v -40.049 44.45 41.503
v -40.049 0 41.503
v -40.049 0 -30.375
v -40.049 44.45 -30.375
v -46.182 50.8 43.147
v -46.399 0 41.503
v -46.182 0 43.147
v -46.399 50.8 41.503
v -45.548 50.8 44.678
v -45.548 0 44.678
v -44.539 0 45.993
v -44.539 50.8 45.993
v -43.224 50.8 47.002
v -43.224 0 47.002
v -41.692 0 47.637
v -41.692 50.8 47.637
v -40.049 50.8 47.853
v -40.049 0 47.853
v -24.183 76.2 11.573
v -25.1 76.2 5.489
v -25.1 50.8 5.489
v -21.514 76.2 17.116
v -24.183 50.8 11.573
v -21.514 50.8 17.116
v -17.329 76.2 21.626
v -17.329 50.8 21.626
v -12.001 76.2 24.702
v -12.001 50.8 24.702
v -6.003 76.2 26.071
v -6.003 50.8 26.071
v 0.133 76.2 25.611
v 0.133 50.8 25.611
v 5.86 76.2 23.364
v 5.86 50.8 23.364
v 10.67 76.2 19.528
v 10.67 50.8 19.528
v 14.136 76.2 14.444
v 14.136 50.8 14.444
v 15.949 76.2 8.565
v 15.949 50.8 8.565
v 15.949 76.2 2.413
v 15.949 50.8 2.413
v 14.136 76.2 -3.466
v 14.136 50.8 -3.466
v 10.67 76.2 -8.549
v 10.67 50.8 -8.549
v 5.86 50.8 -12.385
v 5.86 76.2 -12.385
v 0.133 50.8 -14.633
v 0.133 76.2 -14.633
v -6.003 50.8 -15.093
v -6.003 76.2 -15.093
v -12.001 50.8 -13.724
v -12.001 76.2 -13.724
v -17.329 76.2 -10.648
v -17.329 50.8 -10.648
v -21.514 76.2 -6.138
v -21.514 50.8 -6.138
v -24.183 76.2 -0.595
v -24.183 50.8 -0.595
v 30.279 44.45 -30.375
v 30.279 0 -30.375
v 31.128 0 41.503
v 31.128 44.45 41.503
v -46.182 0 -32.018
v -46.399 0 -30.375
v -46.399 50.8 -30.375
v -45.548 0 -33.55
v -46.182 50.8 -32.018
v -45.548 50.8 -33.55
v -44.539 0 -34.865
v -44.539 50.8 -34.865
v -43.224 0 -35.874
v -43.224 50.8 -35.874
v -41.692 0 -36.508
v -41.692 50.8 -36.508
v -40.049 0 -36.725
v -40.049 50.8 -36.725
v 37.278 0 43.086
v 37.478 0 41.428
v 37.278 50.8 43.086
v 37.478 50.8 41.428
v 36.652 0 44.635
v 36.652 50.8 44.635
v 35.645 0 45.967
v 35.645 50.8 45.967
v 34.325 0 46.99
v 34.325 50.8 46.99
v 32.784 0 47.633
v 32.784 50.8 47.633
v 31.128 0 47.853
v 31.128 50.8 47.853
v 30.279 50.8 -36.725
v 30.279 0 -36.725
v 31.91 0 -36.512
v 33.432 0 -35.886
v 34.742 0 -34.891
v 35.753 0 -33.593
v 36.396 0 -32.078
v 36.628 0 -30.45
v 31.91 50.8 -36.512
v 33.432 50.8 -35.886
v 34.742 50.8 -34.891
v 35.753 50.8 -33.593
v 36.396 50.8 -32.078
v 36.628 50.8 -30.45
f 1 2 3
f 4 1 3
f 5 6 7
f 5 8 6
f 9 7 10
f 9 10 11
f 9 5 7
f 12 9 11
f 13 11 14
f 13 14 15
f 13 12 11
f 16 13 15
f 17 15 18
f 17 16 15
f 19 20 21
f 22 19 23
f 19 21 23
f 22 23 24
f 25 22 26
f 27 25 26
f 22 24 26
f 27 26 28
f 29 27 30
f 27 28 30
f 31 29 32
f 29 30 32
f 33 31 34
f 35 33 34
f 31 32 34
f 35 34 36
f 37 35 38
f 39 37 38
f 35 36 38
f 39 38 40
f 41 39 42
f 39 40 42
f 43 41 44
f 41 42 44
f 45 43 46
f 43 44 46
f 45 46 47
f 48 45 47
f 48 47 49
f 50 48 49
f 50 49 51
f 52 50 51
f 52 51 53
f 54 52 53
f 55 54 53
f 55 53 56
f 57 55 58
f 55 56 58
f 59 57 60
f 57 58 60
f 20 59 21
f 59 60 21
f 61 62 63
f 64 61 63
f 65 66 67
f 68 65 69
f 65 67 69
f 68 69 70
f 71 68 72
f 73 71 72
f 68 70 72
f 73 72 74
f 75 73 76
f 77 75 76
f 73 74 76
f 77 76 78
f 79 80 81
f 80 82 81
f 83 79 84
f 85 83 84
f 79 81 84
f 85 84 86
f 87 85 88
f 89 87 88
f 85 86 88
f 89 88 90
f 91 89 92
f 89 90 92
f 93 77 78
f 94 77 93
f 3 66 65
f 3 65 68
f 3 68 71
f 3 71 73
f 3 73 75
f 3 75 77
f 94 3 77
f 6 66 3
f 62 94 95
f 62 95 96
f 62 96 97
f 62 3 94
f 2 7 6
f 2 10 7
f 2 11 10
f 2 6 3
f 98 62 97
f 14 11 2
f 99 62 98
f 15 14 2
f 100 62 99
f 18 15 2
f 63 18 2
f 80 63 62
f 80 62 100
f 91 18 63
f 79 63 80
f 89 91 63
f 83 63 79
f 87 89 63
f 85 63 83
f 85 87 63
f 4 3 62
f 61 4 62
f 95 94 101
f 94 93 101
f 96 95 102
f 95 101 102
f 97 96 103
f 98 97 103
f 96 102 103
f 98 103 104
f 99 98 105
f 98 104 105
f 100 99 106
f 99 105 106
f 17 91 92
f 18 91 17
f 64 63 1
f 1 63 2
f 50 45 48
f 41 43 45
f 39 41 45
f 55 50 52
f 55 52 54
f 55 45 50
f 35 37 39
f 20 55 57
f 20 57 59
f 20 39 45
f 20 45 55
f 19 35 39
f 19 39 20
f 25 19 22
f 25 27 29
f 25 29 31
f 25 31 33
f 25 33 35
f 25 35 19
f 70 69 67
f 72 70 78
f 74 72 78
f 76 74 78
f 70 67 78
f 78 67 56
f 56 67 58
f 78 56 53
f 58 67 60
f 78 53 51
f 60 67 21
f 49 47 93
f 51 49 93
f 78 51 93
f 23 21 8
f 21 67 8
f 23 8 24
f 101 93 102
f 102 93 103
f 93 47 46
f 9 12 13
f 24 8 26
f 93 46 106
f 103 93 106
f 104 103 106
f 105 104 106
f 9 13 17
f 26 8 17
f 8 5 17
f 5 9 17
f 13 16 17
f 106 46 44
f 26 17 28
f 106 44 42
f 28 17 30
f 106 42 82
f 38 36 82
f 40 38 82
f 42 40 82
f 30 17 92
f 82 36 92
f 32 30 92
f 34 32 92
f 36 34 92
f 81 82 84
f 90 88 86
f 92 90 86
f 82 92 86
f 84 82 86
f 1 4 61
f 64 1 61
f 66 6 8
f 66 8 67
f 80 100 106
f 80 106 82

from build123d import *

# Parameters (mm, degrees)
F1_DEPTH = 50.8
F2_T     = -6.35
F3_R     = 6.35
F4_R     = 20.639799
F5_DEPTH = 25.4


with BuildPart() as f1:
    # F0 (on Front) → F1 (new body)
    with BuildSketch(Plane.XZ):
        Polygon((-46.398684, 47.853038), (-46.398684, -36.724649), (36.554363, -36.724649), (37.55359, 47.853038), align=None)
    extrude(amount=-F1_DEPTH)

    # F2
    f2_openings = [f1.faces().sort_by_distance(p)[0] for p in [
        (-4.671856, 0, 5.648586),
    ]]
    offset(amount=F2_T, openings=f2_openings)

    # F3
    f3_edges = [f1.edges().sort_by_distance(p)[0] for p in [
        (37.55359, 25.4, 47.853038),
        (-46.398684, 25.4, 47.853038),
        (36.554363, 25.4, -36.724649),
        (-46.398684, 25.4, -36.724649),
    ]]
    fillet(f3_edges, radius=F3_R)

    # F4 (on face) → F5 (join)
    with BuildSketch(Plane(origin=(0, 50.8, 0), x_dir=(-1, 0, 0), z_dir=(0, 1, 0))):
        with Locations((4.460279, 5.489179)):
            Circle(F4_R)
    extrude(amount=F5_DEPTH)


solid = f1.part
